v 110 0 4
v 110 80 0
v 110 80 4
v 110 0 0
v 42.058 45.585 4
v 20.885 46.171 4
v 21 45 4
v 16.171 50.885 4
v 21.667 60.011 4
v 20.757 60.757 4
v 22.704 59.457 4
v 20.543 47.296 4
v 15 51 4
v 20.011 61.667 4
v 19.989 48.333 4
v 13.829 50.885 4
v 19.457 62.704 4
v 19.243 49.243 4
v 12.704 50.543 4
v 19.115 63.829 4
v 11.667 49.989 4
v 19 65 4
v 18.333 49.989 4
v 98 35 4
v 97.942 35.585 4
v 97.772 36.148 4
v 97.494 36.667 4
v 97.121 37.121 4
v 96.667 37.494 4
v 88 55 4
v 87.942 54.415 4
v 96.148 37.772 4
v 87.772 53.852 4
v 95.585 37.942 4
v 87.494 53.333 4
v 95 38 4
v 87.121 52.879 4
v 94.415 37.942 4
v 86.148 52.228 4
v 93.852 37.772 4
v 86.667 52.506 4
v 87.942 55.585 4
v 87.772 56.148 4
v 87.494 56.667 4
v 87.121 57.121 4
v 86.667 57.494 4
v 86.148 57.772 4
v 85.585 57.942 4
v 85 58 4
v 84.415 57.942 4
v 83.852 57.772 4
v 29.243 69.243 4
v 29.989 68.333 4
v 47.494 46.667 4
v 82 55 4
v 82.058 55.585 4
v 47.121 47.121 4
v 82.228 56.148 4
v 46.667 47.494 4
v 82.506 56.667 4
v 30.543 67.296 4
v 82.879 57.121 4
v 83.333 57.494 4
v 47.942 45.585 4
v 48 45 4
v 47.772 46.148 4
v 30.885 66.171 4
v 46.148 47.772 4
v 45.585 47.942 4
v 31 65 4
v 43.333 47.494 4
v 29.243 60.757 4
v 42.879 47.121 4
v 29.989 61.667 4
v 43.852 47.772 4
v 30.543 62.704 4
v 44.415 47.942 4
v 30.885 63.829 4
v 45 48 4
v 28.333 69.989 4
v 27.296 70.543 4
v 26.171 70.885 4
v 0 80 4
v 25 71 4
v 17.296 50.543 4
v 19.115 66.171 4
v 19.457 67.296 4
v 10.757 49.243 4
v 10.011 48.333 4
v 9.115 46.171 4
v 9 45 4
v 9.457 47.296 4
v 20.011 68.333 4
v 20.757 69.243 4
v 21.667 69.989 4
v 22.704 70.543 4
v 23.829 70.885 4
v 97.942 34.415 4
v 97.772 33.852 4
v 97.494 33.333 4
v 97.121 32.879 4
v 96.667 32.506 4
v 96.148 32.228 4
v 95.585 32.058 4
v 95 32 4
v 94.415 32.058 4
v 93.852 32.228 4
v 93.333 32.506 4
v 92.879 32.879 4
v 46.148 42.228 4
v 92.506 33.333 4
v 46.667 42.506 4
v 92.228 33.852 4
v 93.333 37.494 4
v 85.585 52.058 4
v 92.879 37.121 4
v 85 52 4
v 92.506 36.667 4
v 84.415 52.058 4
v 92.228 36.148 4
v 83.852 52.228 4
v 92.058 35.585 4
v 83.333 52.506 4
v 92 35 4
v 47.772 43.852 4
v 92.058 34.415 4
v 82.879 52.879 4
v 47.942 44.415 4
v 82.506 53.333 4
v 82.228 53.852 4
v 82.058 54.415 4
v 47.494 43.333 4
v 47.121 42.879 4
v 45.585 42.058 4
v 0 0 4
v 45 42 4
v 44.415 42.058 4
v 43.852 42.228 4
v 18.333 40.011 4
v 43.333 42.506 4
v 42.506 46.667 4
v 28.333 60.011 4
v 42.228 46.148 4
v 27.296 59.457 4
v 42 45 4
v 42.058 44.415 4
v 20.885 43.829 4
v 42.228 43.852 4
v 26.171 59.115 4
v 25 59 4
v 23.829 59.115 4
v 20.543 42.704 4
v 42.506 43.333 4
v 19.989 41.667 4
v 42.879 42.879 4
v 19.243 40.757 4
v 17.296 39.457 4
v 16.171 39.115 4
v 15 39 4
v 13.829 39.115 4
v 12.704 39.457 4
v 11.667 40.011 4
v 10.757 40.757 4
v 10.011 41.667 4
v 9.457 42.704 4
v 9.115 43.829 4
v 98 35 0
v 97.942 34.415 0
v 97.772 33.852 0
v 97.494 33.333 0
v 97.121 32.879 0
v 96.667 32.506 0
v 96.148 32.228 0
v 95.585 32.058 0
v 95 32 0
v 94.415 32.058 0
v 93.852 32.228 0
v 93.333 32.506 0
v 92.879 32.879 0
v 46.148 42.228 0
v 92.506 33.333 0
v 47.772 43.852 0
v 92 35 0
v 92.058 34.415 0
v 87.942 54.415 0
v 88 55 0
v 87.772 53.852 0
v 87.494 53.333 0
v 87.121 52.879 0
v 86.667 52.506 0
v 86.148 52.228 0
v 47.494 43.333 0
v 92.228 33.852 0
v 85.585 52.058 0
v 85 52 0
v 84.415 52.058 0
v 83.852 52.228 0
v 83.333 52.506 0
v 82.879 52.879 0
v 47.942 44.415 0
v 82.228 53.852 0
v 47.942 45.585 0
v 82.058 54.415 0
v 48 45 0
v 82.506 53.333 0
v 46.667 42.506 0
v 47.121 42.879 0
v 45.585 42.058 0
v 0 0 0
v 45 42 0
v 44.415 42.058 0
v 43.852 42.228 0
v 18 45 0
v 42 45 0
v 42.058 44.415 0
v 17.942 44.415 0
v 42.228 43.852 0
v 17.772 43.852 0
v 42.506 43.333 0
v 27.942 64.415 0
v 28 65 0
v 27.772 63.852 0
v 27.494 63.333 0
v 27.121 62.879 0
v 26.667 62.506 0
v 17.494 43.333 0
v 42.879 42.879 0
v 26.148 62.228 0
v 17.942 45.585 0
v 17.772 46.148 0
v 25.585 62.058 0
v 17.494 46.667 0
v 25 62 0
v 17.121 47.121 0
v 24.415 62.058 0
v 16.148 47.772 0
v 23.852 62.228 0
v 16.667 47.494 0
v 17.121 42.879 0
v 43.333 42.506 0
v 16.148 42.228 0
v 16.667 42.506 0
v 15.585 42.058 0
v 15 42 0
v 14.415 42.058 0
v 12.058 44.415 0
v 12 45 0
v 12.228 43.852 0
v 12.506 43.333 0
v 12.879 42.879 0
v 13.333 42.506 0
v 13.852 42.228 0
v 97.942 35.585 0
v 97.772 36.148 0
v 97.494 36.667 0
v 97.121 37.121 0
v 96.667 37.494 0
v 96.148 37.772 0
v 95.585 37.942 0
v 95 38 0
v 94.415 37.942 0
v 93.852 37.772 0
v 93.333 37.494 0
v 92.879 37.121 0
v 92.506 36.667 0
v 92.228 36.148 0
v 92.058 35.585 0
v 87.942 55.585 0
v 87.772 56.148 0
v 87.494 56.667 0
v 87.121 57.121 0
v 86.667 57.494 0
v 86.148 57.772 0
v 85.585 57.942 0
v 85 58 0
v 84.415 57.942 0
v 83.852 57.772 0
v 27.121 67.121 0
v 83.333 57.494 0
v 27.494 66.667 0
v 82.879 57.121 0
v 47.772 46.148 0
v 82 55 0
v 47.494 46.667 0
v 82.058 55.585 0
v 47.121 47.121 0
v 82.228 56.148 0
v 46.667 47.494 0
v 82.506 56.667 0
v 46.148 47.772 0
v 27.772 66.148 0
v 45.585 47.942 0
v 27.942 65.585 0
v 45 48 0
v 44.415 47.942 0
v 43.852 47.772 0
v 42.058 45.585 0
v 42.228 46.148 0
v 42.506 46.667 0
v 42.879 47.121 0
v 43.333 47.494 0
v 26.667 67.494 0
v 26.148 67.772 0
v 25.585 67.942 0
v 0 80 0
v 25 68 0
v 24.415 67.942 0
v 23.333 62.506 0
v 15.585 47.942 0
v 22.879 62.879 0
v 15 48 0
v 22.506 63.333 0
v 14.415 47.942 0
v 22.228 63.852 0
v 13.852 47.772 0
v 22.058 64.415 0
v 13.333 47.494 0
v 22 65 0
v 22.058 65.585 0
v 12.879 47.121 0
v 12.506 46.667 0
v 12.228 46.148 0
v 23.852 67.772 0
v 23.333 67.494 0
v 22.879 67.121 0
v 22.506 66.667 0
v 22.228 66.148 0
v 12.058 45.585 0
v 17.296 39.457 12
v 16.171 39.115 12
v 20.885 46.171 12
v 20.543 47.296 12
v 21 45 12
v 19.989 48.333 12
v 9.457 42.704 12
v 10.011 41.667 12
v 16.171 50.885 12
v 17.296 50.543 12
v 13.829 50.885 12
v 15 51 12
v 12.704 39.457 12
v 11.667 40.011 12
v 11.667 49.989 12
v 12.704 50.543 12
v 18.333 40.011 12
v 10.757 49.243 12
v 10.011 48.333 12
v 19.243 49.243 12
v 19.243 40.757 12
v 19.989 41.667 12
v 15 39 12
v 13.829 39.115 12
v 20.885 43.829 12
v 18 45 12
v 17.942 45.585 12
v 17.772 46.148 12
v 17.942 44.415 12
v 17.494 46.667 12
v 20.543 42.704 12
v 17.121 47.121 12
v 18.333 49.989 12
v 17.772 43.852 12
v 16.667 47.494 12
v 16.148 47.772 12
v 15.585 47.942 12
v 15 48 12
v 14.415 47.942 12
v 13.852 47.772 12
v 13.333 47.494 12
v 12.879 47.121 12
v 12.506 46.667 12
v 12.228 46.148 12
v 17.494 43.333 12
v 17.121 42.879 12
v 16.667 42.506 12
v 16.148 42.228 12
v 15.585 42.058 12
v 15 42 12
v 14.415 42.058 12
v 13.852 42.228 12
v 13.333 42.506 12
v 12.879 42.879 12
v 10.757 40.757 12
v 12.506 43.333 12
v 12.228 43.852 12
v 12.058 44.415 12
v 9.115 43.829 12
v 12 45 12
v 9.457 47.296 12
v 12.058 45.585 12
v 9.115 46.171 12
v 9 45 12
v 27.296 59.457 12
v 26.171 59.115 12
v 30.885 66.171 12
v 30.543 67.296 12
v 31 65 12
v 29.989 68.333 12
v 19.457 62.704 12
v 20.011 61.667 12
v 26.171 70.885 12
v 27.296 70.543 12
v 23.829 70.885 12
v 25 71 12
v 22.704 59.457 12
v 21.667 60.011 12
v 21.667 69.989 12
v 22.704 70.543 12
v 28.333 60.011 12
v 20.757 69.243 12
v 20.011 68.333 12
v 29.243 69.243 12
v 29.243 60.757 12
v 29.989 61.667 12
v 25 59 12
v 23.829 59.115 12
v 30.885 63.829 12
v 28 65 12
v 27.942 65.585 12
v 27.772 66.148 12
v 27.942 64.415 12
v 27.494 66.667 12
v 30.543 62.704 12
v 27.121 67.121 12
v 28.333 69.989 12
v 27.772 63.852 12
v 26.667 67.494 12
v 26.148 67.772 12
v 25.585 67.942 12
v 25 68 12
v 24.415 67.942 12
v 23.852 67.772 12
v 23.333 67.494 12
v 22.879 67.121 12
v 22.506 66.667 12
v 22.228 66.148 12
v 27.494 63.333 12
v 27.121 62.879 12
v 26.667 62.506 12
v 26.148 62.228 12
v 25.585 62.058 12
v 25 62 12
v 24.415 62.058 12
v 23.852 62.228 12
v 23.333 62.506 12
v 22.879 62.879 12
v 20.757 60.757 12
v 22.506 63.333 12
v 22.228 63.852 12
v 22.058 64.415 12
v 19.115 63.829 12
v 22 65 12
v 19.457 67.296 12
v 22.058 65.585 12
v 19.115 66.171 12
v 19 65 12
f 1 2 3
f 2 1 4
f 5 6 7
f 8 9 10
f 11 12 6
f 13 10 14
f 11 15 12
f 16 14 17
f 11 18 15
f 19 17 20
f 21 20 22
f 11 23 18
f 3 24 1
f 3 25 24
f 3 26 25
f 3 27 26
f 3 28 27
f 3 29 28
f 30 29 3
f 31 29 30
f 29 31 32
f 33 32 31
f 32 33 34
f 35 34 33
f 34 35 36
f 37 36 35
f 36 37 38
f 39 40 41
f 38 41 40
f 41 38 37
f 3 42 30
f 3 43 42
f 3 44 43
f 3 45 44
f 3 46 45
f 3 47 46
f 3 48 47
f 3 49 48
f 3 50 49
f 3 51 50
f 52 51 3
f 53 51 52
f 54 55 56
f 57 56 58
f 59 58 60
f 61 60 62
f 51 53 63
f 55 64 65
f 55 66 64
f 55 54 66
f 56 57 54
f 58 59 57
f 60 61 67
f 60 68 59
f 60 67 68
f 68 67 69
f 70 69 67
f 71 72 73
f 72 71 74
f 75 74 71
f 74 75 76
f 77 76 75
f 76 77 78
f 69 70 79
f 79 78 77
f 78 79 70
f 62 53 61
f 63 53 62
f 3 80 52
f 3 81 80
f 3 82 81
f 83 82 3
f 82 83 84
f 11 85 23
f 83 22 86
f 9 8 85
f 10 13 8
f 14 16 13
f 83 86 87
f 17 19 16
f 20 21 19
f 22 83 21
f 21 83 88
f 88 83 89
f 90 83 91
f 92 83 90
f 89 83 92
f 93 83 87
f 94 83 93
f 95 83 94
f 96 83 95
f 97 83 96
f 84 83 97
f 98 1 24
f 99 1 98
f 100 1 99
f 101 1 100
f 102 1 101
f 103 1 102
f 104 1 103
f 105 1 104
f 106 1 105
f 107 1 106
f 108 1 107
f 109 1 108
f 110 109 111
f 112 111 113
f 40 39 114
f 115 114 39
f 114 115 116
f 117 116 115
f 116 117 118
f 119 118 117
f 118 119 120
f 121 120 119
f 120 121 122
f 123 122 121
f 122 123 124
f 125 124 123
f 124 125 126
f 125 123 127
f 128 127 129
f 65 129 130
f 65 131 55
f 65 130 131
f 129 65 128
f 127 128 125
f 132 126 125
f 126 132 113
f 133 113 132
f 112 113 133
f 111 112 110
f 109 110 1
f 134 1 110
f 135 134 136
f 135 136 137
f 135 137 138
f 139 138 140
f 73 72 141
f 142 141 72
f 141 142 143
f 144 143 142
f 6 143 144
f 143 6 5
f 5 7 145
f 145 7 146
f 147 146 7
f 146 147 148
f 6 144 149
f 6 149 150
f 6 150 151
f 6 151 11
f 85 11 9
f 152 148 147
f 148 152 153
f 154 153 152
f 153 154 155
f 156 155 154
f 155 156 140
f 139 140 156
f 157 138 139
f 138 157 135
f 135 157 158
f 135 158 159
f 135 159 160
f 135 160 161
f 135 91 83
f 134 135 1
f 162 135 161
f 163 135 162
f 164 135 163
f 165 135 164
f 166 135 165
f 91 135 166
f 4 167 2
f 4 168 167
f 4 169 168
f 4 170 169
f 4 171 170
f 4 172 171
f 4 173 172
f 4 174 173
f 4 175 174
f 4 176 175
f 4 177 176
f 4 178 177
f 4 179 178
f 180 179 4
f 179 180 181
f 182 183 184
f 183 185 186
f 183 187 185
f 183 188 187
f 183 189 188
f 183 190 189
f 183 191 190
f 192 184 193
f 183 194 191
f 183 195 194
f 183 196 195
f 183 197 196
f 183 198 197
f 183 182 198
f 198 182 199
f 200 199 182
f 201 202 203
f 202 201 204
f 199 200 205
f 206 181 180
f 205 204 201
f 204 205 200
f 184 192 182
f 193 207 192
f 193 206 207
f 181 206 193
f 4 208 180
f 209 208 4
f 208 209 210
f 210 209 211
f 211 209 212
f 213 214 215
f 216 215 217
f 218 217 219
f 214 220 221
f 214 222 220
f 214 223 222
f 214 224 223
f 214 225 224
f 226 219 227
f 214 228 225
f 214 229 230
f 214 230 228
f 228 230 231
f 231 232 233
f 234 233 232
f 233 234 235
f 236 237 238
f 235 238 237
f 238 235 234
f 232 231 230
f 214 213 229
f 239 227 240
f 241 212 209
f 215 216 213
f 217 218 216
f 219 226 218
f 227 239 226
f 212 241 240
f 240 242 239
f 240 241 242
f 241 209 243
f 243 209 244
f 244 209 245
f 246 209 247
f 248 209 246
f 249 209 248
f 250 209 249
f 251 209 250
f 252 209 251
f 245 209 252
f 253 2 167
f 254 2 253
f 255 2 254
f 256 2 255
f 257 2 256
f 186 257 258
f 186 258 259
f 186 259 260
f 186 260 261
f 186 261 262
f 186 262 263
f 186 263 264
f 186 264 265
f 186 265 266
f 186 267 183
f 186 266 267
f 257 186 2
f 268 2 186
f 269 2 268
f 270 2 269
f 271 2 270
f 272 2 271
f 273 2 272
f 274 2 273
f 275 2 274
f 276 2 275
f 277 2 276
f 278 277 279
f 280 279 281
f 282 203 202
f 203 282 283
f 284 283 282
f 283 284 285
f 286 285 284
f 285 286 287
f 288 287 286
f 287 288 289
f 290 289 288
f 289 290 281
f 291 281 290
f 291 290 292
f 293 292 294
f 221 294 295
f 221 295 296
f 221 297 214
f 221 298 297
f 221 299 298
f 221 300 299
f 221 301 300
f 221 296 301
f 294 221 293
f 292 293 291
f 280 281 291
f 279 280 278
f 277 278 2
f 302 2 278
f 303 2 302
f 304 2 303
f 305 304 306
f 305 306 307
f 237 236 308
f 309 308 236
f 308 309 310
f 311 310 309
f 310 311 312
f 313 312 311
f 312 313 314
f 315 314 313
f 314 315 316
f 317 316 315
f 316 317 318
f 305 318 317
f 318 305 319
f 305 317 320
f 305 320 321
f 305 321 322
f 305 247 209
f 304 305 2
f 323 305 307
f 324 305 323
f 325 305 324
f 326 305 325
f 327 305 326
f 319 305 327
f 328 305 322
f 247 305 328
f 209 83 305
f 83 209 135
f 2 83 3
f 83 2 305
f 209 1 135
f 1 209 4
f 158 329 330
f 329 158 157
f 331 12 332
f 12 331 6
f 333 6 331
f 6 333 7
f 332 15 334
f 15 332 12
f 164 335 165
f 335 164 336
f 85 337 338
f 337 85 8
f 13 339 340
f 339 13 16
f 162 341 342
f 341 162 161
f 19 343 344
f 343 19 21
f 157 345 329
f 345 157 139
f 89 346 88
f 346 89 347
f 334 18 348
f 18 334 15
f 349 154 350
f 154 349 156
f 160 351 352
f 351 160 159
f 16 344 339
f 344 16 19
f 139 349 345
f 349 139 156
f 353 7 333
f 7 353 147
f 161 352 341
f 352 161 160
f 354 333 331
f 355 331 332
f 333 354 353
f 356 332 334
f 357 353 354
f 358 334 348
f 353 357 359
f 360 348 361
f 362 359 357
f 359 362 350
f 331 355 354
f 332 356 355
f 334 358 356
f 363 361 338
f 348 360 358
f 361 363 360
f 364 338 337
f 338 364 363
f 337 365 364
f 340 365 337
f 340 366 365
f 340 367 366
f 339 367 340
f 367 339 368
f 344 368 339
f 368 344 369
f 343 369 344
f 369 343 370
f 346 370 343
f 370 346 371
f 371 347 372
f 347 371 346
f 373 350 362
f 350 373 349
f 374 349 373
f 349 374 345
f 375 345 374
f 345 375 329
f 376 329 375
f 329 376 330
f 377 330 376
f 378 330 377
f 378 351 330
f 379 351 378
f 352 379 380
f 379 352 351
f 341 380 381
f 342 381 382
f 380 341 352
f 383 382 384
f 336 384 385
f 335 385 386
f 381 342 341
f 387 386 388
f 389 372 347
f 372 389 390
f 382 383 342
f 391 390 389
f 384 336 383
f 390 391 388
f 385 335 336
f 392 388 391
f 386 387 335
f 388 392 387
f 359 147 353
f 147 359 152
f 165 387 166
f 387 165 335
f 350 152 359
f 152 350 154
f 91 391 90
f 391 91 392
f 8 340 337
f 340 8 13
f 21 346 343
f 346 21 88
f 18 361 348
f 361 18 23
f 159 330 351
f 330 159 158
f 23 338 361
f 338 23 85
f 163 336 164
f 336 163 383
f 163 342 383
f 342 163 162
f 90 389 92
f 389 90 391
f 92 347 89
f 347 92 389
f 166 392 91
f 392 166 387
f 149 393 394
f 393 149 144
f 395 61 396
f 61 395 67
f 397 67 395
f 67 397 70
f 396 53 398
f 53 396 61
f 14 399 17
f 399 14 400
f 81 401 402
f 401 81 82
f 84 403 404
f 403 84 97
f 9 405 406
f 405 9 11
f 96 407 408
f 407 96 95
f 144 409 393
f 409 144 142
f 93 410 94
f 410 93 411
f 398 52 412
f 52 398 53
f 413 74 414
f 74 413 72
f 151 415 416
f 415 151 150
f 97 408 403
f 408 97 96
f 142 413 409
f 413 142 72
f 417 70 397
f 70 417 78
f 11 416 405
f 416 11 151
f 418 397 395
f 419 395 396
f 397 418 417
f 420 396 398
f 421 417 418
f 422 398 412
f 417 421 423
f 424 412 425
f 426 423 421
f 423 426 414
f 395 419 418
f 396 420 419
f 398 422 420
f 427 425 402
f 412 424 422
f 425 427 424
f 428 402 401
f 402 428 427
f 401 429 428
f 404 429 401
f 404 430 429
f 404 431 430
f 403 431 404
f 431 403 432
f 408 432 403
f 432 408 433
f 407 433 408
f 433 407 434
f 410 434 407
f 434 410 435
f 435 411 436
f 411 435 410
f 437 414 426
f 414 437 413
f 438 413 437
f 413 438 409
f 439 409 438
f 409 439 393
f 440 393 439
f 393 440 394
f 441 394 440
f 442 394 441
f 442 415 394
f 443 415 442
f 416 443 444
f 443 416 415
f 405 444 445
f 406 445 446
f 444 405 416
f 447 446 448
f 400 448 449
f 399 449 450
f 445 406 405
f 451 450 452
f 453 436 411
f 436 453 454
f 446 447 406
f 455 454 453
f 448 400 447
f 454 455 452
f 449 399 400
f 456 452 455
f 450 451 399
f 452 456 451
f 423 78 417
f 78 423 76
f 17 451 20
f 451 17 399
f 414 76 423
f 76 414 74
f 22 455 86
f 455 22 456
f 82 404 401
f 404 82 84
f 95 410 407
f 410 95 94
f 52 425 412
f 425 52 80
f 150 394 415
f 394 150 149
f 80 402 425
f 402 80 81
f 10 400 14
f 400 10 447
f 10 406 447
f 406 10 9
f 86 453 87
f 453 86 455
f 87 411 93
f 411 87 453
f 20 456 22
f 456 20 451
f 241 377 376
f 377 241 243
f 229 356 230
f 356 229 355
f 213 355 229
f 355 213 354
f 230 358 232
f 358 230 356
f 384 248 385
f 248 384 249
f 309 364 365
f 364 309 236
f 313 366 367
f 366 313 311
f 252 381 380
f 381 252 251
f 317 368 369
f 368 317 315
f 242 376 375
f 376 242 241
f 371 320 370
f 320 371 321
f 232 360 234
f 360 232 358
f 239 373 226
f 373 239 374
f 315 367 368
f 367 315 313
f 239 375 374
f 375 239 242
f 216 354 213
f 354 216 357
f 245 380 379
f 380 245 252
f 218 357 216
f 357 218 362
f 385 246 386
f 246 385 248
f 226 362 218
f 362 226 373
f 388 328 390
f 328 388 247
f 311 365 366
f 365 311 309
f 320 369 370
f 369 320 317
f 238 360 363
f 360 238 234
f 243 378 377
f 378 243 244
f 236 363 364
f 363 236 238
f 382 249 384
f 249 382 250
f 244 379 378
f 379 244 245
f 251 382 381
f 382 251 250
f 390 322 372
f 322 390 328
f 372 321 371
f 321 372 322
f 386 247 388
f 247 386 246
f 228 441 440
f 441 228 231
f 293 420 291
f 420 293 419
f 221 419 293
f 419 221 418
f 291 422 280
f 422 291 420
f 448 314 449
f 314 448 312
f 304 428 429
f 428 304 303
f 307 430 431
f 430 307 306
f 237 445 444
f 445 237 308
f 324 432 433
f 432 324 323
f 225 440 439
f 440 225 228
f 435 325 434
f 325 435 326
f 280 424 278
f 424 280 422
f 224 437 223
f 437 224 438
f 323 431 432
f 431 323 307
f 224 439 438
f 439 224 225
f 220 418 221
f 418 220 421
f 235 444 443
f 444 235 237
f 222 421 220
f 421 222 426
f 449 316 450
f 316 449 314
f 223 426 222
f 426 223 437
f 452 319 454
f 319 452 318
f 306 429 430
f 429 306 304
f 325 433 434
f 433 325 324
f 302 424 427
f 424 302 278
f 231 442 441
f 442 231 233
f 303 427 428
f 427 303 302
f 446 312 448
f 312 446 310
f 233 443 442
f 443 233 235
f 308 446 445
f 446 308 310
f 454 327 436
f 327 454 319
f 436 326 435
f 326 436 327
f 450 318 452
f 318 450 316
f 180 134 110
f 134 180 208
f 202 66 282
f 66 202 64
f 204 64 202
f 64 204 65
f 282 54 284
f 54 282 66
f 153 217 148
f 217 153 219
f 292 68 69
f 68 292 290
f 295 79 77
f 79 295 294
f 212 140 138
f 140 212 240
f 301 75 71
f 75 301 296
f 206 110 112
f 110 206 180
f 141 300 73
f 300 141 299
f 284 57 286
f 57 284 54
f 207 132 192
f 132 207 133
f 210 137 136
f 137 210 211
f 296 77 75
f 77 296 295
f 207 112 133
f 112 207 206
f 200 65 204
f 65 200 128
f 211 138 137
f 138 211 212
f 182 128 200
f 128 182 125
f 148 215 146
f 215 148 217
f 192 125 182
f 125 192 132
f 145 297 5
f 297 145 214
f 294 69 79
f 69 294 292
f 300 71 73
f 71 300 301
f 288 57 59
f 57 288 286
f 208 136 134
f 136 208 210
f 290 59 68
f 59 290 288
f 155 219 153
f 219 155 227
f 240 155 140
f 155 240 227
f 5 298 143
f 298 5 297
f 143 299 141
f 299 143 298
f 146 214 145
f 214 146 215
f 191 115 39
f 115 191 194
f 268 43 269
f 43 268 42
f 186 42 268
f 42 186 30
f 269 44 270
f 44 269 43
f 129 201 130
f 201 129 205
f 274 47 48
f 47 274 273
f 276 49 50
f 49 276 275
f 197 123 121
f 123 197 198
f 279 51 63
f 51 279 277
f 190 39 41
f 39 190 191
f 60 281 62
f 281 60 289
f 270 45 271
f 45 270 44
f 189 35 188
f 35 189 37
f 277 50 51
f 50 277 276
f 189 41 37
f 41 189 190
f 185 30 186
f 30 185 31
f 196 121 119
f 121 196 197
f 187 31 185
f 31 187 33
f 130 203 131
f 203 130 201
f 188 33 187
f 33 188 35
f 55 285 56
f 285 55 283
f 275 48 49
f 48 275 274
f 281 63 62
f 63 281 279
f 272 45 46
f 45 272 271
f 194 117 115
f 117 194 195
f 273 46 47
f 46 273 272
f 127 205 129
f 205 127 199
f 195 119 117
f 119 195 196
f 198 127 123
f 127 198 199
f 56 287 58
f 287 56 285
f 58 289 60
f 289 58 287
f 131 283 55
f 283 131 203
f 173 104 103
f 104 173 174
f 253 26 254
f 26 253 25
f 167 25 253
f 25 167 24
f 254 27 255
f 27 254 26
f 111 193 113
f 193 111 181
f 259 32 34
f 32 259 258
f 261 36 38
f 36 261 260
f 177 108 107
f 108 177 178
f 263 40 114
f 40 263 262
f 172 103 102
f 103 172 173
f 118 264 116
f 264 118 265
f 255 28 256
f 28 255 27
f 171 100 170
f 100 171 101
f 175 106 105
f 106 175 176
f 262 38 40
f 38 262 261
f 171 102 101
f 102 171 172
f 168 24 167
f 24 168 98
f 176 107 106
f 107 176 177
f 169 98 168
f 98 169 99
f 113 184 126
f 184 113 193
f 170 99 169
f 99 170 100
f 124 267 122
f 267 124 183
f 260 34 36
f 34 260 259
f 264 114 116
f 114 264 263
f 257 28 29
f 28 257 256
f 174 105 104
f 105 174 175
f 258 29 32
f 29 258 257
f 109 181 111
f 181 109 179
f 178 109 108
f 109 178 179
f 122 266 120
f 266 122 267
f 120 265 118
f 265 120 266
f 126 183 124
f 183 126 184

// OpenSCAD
$fn = 32;

// ----------------------------------------------------------------------
// Mixed field: bosses and holes at given coordinates
// ----------------------------------------------------------------------

// --- parameters (mm) ---
plate_l = 110;            // plate length, X
plate_w = 80;             // plate width, Y
plate_t = 4;              // plate thickness, Z
boss_d = 12;              // boss diameter
boss_h = 8;               // boss height above the plate
hole_d = 6;               // through hole diameter

total_h = plate_t + boss_h;  // overall height

difference() {
  union() {
    cube([plate_l, plate_w, plate_t]);
    translate([15, 45, plate_t]) cylinder(h = boss_h, d = boss_d);
    translate([25, 65, plate_t]) cylinder(h = boss_h, d = boss_d);
  }
  translate([15, 45, -1]) cylinder(h = total_h + 2, d = boss_d / 2);
  translate([25, 65, -1]) cylinder(h = total_h + 2, d = boss_d / 2);
  translate([45, 45, -1]) cylinder(h = plate_t + 2, d = hole_d);
  translate([85, 55, -1]) cylinder(h = plate_t + 2, d = hole_d);
  translate([95, 35, -1]) cylinder(h = plate_t + 2, d = hole_d);
}
